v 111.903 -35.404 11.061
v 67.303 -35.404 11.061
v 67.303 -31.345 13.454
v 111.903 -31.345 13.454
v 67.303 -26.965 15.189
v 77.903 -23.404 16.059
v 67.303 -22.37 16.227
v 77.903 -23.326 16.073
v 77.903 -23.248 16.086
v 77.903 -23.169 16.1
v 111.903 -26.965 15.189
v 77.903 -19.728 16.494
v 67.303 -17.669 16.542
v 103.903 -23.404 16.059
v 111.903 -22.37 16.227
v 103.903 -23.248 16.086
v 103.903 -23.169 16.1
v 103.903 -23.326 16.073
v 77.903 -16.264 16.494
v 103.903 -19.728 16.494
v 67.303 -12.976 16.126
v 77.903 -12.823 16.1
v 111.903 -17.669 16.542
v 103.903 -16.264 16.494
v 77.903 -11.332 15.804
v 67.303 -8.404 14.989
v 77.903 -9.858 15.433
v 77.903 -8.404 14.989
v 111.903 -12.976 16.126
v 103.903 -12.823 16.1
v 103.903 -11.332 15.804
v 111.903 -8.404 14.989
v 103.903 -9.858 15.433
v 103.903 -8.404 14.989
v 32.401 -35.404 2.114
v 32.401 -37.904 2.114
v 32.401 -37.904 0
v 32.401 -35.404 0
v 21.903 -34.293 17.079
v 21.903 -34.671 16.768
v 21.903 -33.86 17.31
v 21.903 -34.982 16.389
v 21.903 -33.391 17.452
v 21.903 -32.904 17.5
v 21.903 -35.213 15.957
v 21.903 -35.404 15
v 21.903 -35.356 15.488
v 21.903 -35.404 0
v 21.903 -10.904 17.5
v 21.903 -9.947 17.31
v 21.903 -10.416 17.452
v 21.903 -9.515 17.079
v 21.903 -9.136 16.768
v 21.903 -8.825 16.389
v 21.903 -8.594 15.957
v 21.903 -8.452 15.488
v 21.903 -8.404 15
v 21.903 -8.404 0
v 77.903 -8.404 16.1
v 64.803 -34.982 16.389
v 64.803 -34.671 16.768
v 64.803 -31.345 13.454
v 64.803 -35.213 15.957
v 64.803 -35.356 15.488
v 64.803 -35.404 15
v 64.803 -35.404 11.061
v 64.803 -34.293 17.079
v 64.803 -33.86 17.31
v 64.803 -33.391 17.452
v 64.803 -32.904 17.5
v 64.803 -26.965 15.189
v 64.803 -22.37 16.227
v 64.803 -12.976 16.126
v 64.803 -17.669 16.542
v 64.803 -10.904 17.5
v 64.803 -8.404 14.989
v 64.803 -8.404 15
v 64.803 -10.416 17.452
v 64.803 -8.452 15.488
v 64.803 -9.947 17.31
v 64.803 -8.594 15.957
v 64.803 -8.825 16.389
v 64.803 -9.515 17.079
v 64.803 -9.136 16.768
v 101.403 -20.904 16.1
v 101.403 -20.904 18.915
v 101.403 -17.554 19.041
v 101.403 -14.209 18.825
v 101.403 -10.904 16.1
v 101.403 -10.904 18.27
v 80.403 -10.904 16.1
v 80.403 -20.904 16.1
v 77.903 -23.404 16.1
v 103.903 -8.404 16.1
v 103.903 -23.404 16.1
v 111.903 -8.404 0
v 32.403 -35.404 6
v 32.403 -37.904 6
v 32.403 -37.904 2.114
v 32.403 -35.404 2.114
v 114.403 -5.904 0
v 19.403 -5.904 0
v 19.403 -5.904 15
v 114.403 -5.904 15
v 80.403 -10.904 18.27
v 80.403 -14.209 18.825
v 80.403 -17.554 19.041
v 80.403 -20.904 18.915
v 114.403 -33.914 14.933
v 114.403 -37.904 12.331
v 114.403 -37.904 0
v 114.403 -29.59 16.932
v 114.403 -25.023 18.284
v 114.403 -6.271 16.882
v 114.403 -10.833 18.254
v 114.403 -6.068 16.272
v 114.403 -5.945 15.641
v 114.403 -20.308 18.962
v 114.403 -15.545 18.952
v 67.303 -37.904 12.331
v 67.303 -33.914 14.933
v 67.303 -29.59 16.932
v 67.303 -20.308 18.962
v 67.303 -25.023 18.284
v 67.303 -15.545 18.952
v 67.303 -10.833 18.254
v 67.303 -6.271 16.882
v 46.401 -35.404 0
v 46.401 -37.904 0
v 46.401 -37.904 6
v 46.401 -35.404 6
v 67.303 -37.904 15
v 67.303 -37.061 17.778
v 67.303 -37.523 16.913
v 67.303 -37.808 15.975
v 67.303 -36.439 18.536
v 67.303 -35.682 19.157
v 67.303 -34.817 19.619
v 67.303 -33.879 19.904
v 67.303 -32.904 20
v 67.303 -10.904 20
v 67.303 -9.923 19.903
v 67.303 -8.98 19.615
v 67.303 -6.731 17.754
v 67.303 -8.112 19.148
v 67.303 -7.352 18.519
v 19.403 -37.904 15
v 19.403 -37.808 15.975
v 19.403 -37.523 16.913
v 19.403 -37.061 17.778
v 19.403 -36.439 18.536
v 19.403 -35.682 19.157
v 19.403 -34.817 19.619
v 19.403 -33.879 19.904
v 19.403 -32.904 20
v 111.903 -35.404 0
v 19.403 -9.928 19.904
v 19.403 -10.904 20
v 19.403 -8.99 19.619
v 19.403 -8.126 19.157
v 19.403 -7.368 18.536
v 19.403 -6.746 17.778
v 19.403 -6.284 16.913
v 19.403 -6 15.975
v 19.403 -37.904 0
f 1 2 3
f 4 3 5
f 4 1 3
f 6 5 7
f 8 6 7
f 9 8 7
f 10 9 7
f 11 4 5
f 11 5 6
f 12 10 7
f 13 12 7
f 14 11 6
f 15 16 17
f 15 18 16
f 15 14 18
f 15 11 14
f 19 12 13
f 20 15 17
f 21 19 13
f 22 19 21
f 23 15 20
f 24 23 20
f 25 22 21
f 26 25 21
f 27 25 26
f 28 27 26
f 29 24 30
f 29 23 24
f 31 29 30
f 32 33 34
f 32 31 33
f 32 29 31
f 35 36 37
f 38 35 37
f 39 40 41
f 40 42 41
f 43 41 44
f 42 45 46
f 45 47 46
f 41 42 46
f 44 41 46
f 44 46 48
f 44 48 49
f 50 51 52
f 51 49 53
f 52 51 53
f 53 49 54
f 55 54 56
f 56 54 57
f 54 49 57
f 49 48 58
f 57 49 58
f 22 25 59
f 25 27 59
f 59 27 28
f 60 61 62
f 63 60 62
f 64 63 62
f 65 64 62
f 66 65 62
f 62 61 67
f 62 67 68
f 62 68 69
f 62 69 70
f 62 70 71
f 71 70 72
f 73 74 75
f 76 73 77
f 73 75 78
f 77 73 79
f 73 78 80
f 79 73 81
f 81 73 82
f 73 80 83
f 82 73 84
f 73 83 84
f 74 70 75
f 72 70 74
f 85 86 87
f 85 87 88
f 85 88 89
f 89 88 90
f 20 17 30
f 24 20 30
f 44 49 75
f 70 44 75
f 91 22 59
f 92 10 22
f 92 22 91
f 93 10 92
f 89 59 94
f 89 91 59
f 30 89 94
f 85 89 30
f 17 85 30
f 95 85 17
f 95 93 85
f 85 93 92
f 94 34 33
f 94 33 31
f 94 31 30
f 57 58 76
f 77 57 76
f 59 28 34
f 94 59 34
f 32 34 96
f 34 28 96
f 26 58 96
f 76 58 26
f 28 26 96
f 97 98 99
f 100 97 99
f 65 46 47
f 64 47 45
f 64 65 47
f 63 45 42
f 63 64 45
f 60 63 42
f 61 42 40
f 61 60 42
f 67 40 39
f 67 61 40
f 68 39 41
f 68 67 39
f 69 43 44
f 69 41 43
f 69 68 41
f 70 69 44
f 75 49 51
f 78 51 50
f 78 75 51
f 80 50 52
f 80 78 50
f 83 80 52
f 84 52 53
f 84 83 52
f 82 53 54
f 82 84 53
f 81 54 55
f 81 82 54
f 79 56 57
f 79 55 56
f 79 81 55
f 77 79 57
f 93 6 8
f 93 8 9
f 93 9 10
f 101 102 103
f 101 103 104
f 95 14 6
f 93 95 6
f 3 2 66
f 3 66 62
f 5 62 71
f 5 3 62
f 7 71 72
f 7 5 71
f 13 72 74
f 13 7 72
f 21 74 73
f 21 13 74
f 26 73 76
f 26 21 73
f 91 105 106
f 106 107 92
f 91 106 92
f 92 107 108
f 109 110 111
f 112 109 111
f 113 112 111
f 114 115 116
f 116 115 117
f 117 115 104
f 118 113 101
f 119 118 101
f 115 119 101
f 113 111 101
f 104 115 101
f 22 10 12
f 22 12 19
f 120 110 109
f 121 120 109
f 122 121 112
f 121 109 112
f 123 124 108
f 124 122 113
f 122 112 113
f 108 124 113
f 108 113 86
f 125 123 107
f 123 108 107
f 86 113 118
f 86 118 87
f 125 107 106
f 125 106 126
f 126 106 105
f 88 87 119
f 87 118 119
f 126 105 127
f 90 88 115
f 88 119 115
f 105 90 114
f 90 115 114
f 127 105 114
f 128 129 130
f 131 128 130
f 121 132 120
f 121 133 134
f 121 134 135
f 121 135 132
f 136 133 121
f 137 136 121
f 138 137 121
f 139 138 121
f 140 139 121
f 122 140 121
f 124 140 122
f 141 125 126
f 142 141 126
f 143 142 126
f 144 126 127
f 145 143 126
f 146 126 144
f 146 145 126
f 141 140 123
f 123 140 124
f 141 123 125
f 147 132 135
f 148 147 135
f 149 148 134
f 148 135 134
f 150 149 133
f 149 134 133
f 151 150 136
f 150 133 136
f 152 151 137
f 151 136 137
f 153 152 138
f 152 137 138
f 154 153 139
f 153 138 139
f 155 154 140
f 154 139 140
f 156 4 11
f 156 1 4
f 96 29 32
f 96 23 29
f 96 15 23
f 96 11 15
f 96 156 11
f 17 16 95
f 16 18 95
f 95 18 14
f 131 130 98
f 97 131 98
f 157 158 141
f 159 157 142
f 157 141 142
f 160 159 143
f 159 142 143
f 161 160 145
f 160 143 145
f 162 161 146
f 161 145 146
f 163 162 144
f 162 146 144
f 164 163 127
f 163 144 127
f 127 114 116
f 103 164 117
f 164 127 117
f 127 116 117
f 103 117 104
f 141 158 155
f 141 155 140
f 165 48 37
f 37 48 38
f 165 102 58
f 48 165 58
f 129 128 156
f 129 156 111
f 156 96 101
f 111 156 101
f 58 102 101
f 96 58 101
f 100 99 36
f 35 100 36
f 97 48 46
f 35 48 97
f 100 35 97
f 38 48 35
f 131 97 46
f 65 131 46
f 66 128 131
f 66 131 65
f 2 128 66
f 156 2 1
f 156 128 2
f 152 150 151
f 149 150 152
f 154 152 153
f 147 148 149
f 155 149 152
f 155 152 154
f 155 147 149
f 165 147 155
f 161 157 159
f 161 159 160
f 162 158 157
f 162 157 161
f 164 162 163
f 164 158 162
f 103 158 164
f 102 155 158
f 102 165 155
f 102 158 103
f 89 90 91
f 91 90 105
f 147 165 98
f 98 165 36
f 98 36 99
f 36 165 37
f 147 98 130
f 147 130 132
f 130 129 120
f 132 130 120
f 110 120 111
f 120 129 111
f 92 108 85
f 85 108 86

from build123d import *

# Parameters (mm, degrees)
F0_W        = 95
F0_H        = 32
F1_DEPTH    = 20
F3_R        = 5
F4_R        = 5
F6_DEPTH    = 25
F7_DEPTH    = 47.1
F8_T        = 2.5
F8_T3_DEPTH = 23.9149246247
F8_T5_DEPTH = 23.2696171533
F8_T8_ANGLE = 58.1590270575
F9_W        = 21
F9_H        = 10
F10_DEPTH   = 16.1
F13_DEPTH   = 25


# Not quite as in the source:
# - a shell that OpenCascade refuses in one call is made with other operations: the cavity is built on its own and cut out


with BuildPart() as f1:
    # F0 (on Top) → F1 (new body)
    with BuildSketch(Plane.XY):
        with Locations((66.9030988216, -21.9037037492)):
            Rectangle(F0_W, F0_H)
    extrude(amount=F1_DEPTH)

    # F3
    f3_edges = [f1.edges().sort_by_distance(p)[0] for p in [
        (66.903099, -37.903704, 20),
    ]]
    fillet(f3_edges, radius=F3_R)

    # F4
    f4_edges = [f1.edges().sort_by_distance(p)[0] for p in [
        (66.903099, -5.903704, 20),
    ]]
    fillet(f4_edges, radius=F4_R)

    # F5 (on face) → F6 (cut)
    with BuildSketch(Plane.XY.offset(20)):
        Polygon((101.4030988216, -20.6582732499), (101.4030988216, -10.9037037492), (80.4030988216, -10.9037037492), (80.4030988216, -20.9037037492), (101.4030988216, -20.9037037492), align=None)
    extrude(amount=-F6_DEPTH, mode=Mode.SUBTRACT)

    # F2 (on face) → F7 (cut)
    with BuildSketch(Plane.YZ.offset(114.4030988216)):
        with BuildLine():
            ThreePointArc((-37.9037037492, 12.3313413933), (-22.4823614594, 18.7362249856), (-5.9037037492, 16.7391169816))
            Line((-5.9037037492, 16.7391169816), (-5.9037037492, 20))
            Line((-5.9037037492, 20), (-37.9037037492, 20))
            Line((-37.9037037492, 20), (-37.9037037492, 12.3313413933))
        make_face()
    extrude(amount=-F7_DEPTH, mode=Mode.SUBTRACT)

    # F8: shell of thickness 2.5, made by hand


with BuildPart() as f8_core1:
    # F8_t2: copy of F1
    add(f1.part)

    # the walls: a layer under each face that stays
    f8_faces = [f8_core1.faces().sort_by_distance(p)[0] for p in [
        (19.4030988216, -21.9037037492, 10),
        (43.3530988216, -21.9037037492, 20),
        (66.9030988216, -7.3681698432, 18.5355339059),
        (43.3530988216, -36.4392376551, 18.5355339059),
        (66.9030988216, -5.9037037492, 7.5),
        (66.9030988216, -37.9037037492, 7.5),
        (67.3030988216, -32.6316572711, 16.1656706966),
        (90.8530988216, -22.6776915616, 18.7087222914),
        (114.4030988216, -21.9037037492, 9.5218727657),
        (80.4030988216, -15.9037037492, 9.5218727657),
        (90.9030988216, -20.9037037492, 9.4574623123),
        (101.4030988216, -15.9037037492, 9.5218727657),
        (90.9030988216, -10.9037037492, 9.1348085767),
    ]]
    thicken(f8_faces, amount=-F8_T, mode=Mode.SUBTRACT)

    # F8_s4 → F8_t3 (cut)
    with BuildSketch(Plane.XY.offset(-2.5)):
        Polygon((80.4280988216, -20.8787037492), (77.9030988216, -20.9037037492), (77.9030988216, -23.4037037492), (80.4030988216, -23.4037037492), align=None)
        Polygon((101.3780988216, -20.8787037492), (101.4030988216, -23.4037037492), (103.9030988216, -23.4037037492), (103.9030988216, -20.9037037492), align=None)
    extrude(amount=F8_T3_DEPTH, mode=Mode.SUBTRACT)

    # F8_s6 → F8_t5 (cut)
    with BuildSketch(Plane.XY.offset(-2.5)):
        Polygon((80.4280988216, -10.9287037492), (77.9030988216, -10.9037037492), (77.9030988216, -8.4037037492), (80.4030988216, -8.4037037492), align=None)
        Polygon((101.3780988216, -10.9287037492), (103.9030988216, -10.9037037492), (103.9030988216, -8.4037037492), (101.4030988216, -8.4037037492), align=None)
    extrude(amount=F8_T5_DEPTH, mode=Mode.SUBTRACT)

    # F8_s7 → F8_t8 (revolve, cut)
    with BuildSketch(Plane(origin=(0, -18.0639523955, -13.7441213447), x_dir=(1, 0, 0), z_dir=(0, -0.7958327334, -0.6055165237))):
        Polygon((67.3280988216, 32.7900040558), (64.8030988216, 32.7650040558), (64.8030988216, 30.2650040558), (67.3030988216, 30.2650040558), align=None)
    revolve(axis=Axis((67.3030988216, -17.9961461515, -13.8332393562), (-1, 0, 0)), revolution_arc=F8_T8_ANGLE, mode=Mode.SUBTRACT)


with BuildPart() as f1_1:
    add(f1.part)

    # what is left inside the walls is the cavity
    f8_cavity = [f8_core1.part.solids().sort_by_distance(p)[0] for p in [
        (66.903099, -26.403704, 0.025),
    ]]
    add(f8_cavity, mode=Mode.SUBTRACT)

    # F9 (on face) → F10 (cut)
    with BuildSketch(Plane(origin=(0, 0, 0), x_dir=(1, 0, 0), z_dir=(0, 0, -1))):
        Polygon((77.9030988216, 10.9037037492), (77.9030988216, 8.4037037492), (103.9030988216, 8.4037037492), (103.9030988216, 10.9037037492), (103.9030988216, 20.9037037492), (103.9030988216, 23.4037037492), (77.9030988216, 23.4037037492), (77.9030988216, 20.9037037492), align=None)
        with Locations((90.9030988216, 15.9037037492)):
            Rectangle(F9_W, F9_H, mode=Mode.SUBTRACT)
    extrude(amount=-F10_DEPTH, mode=Mode.SUBTRACT)

    # F12 (on face) → F13 (cut)
    with BuildSketch(Plane.XZ.offset(37.9037037492)):
        Polygon((46.4005000293, 6), (32.4030988216, 6), (32.4030988216, 2.1138605662), (32.4005000293, 2.1138605662), (32.4005000293, 0), (46.4005000293, 0), align=None)
    extrude(amount=-F13_DEPTH, mode=Mode.SUBTRACT)


solid = f1_1.part
